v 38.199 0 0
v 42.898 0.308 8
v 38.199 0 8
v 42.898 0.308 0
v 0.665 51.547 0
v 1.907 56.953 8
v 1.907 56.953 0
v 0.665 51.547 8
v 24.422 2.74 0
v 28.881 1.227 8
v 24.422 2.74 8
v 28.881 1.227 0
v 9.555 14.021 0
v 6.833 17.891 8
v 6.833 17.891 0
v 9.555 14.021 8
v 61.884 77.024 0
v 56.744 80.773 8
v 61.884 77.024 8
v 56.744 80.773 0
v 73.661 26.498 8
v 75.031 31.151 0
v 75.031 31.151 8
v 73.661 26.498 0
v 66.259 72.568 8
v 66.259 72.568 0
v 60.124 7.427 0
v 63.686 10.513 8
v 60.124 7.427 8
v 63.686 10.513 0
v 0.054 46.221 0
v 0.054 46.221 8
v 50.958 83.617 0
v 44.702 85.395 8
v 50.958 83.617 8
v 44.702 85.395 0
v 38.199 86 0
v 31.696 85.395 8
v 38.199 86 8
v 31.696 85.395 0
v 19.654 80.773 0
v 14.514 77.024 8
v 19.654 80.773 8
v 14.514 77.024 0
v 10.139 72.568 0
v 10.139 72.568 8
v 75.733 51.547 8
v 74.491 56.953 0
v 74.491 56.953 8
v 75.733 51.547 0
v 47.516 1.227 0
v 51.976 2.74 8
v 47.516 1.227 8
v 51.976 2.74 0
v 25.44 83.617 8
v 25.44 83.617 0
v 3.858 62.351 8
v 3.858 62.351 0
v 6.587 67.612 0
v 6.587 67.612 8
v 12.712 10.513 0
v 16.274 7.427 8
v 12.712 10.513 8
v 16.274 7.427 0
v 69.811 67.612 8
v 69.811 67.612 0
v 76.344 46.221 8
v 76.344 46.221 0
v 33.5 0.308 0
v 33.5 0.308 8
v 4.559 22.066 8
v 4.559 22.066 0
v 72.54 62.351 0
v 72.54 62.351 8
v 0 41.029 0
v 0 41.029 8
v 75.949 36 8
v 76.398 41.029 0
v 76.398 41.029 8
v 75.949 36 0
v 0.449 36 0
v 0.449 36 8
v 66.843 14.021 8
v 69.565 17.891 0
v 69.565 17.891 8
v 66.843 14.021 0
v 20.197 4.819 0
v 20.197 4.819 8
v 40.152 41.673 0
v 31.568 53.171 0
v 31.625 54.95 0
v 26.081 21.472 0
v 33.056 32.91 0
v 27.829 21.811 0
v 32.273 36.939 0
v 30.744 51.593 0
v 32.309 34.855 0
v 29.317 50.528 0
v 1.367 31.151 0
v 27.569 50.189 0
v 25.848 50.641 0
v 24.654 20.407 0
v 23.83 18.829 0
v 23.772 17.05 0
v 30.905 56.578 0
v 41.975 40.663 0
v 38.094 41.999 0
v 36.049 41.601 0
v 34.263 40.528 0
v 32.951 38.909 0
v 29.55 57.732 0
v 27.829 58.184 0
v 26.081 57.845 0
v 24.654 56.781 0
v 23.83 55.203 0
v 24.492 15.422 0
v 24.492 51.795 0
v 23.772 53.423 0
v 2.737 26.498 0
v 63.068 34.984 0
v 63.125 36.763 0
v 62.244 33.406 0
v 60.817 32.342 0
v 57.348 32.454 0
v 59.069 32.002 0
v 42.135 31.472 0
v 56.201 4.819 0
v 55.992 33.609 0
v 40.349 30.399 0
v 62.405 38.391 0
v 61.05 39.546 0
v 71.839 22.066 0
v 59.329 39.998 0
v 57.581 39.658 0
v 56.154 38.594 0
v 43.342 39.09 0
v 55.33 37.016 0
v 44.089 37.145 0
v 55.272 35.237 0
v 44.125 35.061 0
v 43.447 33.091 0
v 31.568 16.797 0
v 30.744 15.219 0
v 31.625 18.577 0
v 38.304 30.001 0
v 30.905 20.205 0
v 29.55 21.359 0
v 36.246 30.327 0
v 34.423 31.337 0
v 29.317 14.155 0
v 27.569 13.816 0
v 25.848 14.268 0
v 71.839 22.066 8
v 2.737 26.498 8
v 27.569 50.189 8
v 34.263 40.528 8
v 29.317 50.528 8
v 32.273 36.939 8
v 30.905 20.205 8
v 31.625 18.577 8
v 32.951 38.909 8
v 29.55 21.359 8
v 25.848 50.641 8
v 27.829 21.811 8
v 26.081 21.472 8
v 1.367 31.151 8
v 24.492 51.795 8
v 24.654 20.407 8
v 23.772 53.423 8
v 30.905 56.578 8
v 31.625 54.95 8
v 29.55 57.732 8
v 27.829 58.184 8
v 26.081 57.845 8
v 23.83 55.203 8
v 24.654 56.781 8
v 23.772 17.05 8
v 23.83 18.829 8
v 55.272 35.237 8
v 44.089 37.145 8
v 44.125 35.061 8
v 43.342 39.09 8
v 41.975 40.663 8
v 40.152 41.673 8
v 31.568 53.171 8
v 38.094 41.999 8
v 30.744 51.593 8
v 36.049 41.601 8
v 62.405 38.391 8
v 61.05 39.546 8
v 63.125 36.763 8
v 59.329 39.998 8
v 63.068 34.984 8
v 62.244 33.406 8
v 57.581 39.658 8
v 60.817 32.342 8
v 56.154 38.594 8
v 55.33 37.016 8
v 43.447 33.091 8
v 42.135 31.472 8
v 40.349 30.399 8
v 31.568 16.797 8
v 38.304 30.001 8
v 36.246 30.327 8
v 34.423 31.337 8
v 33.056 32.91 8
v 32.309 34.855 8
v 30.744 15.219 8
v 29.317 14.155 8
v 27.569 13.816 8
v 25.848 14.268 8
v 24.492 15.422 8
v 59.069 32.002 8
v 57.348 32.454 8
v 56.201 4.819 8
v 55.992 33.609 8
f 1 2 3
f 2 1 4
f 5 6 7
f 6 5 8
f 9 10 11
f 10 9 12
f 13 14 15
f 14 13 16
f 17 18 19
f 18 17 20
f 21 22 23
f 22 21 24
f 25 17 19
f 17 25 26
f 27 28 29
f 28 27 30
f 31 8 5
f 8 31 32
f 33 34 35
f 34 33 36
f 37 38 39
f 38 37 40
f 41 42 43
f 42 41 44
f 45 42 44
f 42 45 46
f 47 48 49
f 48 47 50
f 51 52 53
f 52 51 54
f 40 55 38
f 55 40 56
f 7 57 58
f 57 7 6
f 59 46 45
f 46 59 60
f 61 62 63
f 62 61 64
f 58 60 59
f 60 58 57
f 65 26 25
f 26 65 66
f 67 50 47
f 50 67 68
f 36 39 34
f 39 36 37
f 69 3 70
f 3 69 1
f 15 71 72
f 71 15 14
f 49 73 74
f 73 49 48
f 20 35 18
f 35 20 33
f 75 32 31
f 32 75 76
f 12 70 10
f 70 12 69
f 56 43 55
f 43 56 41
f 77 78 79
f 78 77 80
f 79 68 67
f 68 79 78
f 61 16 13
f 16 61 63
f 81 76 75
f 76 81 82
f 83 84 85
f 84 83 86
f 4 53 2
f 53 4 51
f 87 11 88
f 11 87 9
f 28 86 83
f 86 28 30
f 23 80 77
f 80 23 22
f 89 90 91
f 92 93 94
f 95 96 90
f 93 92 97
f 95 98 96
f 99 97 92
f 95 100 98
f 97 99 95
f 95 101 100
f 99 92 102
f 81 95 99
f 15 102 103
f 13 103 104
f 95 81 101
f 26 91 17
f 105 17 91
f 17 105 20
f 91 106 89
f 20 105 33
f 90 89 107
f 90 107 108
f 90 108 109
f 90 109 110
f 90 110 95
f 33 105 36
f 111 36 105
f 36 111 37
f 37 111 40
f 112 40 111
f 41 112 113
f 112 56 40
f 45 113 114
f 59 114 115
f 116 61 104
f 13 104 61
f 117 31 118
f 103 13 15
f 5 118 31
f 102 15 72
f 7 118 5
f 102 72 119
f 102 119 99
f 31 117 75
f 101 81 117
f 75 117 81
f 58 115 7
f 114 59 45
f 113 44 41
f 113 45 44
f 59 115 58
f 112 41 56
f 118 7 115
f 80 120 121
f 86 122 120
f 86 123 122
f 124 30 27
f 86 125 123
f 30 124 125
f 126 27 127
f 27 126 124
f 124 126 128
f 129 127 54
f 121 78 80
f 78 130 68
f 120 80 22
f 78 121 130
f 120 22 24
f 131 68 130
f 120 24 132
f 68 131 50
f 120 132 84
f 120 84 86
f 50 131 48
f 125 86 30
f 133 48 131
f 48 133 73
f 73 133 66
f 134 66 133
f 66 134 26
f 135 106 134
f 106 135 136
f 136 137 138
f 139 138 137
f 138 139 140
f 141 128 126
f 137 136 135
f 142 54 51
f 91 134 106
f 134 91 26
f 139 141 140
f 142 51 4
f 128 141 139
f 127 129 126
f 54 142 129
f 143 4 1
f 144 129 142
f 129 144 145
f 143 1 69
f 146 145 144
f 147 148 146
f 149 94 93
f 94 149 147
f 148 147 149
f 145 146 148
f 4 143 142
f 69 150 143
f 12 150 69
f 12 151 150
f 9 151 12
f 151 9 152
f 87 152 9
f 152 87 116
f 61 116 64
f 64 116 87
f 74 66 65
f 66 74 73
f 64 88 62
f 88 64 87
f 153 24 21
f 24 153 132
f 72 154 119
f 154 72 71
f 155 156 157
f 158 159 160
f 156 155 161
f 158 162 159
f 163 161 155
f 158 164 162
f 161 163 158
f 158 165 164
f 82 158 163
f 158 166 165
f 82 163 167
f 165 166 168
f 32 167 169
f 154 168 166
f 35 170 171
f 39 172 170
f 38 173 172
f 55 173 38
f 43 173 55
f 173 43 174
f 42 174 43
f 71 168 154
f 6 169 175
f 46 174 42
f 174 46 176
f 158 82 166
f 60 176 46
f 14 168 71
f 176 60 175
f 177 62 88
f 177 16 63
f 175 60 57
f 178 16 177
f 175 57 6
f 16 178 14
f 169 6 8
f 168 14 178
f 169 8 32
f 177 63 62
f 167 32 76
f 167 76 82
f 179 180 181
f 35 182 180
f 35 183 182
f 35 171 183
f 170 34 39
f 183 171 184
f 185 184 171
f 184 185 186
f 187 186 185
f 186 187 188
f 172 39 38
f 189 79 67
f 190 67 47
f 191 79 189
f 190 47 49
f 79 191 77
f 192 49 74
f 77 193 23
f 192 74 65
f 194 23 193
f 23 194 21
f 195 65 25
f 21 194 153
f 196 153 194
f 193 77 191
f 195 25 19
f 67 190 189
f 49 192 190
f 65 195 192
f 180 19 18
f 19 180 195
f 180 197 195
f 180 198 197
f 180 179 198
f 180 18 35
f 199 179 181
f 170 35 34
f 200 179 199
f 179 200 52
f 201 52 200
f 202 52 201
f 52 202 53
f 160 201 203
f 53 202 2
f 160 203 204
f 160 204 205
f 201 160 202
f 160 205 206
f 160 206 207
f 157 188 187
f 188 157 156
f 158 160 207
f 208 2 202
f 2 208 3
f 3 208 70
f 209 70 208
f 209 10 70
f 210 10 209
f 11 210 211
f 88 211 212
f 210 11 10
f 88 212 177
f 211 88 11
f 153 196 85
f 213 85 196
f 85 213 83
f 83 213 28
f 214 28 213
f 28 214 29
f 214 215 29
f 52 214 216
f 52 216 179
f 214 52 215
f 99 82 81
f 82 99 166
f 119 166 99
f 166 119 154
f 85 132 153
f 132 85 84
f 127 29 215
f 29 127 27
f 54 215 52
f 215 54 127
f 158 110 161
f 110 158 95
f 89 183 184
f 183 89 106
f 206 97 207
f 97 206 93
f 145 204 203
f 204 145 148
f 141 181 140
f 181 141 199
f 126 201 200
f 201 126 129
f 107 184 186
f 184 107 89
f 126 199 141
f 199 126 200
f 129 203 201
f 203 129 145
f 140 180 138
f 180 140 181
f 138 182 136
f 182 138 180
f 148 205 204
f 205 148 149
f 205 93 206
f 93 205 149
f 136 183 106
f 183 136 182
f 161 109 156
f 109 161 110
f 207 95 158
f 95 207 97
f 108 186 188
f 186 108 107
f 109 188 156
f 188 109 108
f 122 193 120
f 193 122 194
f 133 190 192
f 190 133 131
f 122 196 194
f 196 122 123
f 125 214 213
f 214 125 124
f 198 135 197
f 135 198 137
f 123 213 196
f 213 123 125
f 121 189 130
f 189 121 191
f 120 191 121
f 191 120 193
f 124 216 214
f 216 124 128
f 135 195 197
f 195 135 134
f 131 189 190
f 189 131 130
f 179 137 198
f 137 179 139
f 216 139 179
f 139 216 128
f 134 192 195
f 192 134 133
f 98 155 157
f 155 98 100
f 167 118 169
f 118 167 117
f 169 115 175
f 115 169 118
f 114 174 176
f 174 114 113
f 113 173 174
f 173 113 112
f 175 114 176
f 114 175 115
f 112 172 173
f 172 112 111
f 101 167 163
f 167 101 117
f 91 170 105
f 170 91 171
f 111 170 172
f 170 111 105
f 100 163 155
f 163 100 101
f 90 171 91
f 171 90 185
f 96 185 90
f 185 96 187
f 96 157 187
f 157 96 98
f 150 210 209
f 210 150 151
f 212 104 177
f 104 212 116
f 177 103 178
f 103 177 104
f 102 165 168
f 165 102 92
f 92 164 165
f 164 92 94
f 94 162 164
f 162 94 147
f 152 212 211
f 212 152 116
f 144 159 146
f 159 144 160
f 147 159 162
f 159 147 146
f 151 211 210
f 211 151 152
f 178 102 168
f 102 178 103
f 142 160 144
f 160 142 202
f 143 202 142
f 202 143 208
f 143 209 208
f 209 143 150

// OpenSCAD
$fn = 32;

// ----------------------------------------------------------------------
// Cam plate: single_lobe cam, base R36
// ----------------------------------------------------------------------

// --- parameters (mm) ---
base_r = 36;              // base circle radius
lobe_h = 14;              // cam lobe rise
bore_r = 6;               // shaft bore radius
plate_t = 8;              // plate thickness, Z (extrusion height)
ring_r = 21;              // lightening ring radius
bolt_r = 4;               // lightening hole radius

profile = [[75.949, 36], [76.398, 41.029], [76.344, 46.221], [75.733, 51.547], [74.491, 56.953], [72.54, 62.351], [69.811, 67.612], [66.259, 72.568], [61.884, 77.024], [56.744, 80.773], [50.958, 83.617], [44.702, 85.395], [38.199, 86], [31.696, 85.395], [25.44, 83.617], [19.654, 80.773], [14.514, 77.024], [10.139, 72.568], [6.587, 67.612], [3.858, 62.351], [1.907, 56.953], [0.665, 51.547], [0.054, 46.221], [0, 41.029], [0.449, 36], [1.367, 31.151], [2.737, 26.498], [4.559, 22.066], [6.833, 17.891], [9.555, 14.021], [12.712, 10.513], [16.274, 7.427], [20.197, 4.819], [24.422, 2.74], [28.881, 1.227], [33.5, 0.308], [38.199, 0], [42.898, 0.308], [47.516, 1.227], [51.976, 2.74], [56.201, 4.819], [60.124, 7.427], [63.686, 10.513], [66.843, 14.021], [69.565, 17.891], [71.839, 22.066], [73.661, 26.498], [75.031, 31.151]];  // primary outline, 48 points, counter clockwise
void_1 = [[44.089, 37.145], [43.342, 39.09], [41.975, 40.663], [40.152, 41.673], [38.094, 41.999], [36.049, 41.601], [34.263, 40.528], [32.951, 38.909], [32.273, 36.939], [32.309, 34.855], [33.056, 32.91], [34.423, 31.337], [36.246, 30.327], [38.304, 30.001], [40.349, 30.399], [42.135, 31.472], [43.447, 33.091], [44.125, 35.061]];  // shaft bore, 18 points
void_2 = [[63.125, 36.763], [62.405, 38.391], [61.05, 39.546], [59.329, 39.998], [57.581, 39.658], [56.154, 38.594], [55.33, 37.016], [55.272, 35.237], [55.992, 33.609], [57.348, 32.454], [59.069, 32.002], [60.817, 32.342], [62.244, 33.406], [63.068, 34.984]];  // lightening hole 1, 14 points
void_3 = [[31.625, 54.95], [30.905, 56.578], [29.55, 57.732], [27.829, 58.184], [26.081, 57.845], [24.654, 56.781], [23.83, 55.203], [23.772, 53.423], [24.492, 51.795], [25.848, 50.641], [27.569, 50.189], [29.317, 50.528], [30.744, 51.593], [31.568, 53.171]];  // lightening hole 2, 14 points
void_4 = [[31.625, 18.577], [30.905, 20.205], [29.55, 21.359], [27.829, 21.811], [26.081, 21.472], [24.654, 20.407], [23.83, 18.829], [23.772, 17.05], [24.492, 15.422], [25.848, 14.268], [27.569, 13.816], [29.317, 14.155], [30.744, 15.219], [31.568, 16.797]];  // lightening hole 3, 14 points

// --- the one profile operation ---
difference() {
  linear_extrude(height = plate_t) polygon(points = profile);
  translate([0, 0, -1])
    linear_extrude(height = plate_t + 2) polygon(points = void_1);
  translate([0, 0, -1])
    linear_extrude(height = plate_t + 2) polygon(points = void_2);
  translate([0, 0, -1])
    linear_extrude(height = plate_t + 2) polygon(points = void_3);
  translate([0, 0, -1])
    linear_extrude(height = plate_t + 2) polygon(points = void_4);
}
